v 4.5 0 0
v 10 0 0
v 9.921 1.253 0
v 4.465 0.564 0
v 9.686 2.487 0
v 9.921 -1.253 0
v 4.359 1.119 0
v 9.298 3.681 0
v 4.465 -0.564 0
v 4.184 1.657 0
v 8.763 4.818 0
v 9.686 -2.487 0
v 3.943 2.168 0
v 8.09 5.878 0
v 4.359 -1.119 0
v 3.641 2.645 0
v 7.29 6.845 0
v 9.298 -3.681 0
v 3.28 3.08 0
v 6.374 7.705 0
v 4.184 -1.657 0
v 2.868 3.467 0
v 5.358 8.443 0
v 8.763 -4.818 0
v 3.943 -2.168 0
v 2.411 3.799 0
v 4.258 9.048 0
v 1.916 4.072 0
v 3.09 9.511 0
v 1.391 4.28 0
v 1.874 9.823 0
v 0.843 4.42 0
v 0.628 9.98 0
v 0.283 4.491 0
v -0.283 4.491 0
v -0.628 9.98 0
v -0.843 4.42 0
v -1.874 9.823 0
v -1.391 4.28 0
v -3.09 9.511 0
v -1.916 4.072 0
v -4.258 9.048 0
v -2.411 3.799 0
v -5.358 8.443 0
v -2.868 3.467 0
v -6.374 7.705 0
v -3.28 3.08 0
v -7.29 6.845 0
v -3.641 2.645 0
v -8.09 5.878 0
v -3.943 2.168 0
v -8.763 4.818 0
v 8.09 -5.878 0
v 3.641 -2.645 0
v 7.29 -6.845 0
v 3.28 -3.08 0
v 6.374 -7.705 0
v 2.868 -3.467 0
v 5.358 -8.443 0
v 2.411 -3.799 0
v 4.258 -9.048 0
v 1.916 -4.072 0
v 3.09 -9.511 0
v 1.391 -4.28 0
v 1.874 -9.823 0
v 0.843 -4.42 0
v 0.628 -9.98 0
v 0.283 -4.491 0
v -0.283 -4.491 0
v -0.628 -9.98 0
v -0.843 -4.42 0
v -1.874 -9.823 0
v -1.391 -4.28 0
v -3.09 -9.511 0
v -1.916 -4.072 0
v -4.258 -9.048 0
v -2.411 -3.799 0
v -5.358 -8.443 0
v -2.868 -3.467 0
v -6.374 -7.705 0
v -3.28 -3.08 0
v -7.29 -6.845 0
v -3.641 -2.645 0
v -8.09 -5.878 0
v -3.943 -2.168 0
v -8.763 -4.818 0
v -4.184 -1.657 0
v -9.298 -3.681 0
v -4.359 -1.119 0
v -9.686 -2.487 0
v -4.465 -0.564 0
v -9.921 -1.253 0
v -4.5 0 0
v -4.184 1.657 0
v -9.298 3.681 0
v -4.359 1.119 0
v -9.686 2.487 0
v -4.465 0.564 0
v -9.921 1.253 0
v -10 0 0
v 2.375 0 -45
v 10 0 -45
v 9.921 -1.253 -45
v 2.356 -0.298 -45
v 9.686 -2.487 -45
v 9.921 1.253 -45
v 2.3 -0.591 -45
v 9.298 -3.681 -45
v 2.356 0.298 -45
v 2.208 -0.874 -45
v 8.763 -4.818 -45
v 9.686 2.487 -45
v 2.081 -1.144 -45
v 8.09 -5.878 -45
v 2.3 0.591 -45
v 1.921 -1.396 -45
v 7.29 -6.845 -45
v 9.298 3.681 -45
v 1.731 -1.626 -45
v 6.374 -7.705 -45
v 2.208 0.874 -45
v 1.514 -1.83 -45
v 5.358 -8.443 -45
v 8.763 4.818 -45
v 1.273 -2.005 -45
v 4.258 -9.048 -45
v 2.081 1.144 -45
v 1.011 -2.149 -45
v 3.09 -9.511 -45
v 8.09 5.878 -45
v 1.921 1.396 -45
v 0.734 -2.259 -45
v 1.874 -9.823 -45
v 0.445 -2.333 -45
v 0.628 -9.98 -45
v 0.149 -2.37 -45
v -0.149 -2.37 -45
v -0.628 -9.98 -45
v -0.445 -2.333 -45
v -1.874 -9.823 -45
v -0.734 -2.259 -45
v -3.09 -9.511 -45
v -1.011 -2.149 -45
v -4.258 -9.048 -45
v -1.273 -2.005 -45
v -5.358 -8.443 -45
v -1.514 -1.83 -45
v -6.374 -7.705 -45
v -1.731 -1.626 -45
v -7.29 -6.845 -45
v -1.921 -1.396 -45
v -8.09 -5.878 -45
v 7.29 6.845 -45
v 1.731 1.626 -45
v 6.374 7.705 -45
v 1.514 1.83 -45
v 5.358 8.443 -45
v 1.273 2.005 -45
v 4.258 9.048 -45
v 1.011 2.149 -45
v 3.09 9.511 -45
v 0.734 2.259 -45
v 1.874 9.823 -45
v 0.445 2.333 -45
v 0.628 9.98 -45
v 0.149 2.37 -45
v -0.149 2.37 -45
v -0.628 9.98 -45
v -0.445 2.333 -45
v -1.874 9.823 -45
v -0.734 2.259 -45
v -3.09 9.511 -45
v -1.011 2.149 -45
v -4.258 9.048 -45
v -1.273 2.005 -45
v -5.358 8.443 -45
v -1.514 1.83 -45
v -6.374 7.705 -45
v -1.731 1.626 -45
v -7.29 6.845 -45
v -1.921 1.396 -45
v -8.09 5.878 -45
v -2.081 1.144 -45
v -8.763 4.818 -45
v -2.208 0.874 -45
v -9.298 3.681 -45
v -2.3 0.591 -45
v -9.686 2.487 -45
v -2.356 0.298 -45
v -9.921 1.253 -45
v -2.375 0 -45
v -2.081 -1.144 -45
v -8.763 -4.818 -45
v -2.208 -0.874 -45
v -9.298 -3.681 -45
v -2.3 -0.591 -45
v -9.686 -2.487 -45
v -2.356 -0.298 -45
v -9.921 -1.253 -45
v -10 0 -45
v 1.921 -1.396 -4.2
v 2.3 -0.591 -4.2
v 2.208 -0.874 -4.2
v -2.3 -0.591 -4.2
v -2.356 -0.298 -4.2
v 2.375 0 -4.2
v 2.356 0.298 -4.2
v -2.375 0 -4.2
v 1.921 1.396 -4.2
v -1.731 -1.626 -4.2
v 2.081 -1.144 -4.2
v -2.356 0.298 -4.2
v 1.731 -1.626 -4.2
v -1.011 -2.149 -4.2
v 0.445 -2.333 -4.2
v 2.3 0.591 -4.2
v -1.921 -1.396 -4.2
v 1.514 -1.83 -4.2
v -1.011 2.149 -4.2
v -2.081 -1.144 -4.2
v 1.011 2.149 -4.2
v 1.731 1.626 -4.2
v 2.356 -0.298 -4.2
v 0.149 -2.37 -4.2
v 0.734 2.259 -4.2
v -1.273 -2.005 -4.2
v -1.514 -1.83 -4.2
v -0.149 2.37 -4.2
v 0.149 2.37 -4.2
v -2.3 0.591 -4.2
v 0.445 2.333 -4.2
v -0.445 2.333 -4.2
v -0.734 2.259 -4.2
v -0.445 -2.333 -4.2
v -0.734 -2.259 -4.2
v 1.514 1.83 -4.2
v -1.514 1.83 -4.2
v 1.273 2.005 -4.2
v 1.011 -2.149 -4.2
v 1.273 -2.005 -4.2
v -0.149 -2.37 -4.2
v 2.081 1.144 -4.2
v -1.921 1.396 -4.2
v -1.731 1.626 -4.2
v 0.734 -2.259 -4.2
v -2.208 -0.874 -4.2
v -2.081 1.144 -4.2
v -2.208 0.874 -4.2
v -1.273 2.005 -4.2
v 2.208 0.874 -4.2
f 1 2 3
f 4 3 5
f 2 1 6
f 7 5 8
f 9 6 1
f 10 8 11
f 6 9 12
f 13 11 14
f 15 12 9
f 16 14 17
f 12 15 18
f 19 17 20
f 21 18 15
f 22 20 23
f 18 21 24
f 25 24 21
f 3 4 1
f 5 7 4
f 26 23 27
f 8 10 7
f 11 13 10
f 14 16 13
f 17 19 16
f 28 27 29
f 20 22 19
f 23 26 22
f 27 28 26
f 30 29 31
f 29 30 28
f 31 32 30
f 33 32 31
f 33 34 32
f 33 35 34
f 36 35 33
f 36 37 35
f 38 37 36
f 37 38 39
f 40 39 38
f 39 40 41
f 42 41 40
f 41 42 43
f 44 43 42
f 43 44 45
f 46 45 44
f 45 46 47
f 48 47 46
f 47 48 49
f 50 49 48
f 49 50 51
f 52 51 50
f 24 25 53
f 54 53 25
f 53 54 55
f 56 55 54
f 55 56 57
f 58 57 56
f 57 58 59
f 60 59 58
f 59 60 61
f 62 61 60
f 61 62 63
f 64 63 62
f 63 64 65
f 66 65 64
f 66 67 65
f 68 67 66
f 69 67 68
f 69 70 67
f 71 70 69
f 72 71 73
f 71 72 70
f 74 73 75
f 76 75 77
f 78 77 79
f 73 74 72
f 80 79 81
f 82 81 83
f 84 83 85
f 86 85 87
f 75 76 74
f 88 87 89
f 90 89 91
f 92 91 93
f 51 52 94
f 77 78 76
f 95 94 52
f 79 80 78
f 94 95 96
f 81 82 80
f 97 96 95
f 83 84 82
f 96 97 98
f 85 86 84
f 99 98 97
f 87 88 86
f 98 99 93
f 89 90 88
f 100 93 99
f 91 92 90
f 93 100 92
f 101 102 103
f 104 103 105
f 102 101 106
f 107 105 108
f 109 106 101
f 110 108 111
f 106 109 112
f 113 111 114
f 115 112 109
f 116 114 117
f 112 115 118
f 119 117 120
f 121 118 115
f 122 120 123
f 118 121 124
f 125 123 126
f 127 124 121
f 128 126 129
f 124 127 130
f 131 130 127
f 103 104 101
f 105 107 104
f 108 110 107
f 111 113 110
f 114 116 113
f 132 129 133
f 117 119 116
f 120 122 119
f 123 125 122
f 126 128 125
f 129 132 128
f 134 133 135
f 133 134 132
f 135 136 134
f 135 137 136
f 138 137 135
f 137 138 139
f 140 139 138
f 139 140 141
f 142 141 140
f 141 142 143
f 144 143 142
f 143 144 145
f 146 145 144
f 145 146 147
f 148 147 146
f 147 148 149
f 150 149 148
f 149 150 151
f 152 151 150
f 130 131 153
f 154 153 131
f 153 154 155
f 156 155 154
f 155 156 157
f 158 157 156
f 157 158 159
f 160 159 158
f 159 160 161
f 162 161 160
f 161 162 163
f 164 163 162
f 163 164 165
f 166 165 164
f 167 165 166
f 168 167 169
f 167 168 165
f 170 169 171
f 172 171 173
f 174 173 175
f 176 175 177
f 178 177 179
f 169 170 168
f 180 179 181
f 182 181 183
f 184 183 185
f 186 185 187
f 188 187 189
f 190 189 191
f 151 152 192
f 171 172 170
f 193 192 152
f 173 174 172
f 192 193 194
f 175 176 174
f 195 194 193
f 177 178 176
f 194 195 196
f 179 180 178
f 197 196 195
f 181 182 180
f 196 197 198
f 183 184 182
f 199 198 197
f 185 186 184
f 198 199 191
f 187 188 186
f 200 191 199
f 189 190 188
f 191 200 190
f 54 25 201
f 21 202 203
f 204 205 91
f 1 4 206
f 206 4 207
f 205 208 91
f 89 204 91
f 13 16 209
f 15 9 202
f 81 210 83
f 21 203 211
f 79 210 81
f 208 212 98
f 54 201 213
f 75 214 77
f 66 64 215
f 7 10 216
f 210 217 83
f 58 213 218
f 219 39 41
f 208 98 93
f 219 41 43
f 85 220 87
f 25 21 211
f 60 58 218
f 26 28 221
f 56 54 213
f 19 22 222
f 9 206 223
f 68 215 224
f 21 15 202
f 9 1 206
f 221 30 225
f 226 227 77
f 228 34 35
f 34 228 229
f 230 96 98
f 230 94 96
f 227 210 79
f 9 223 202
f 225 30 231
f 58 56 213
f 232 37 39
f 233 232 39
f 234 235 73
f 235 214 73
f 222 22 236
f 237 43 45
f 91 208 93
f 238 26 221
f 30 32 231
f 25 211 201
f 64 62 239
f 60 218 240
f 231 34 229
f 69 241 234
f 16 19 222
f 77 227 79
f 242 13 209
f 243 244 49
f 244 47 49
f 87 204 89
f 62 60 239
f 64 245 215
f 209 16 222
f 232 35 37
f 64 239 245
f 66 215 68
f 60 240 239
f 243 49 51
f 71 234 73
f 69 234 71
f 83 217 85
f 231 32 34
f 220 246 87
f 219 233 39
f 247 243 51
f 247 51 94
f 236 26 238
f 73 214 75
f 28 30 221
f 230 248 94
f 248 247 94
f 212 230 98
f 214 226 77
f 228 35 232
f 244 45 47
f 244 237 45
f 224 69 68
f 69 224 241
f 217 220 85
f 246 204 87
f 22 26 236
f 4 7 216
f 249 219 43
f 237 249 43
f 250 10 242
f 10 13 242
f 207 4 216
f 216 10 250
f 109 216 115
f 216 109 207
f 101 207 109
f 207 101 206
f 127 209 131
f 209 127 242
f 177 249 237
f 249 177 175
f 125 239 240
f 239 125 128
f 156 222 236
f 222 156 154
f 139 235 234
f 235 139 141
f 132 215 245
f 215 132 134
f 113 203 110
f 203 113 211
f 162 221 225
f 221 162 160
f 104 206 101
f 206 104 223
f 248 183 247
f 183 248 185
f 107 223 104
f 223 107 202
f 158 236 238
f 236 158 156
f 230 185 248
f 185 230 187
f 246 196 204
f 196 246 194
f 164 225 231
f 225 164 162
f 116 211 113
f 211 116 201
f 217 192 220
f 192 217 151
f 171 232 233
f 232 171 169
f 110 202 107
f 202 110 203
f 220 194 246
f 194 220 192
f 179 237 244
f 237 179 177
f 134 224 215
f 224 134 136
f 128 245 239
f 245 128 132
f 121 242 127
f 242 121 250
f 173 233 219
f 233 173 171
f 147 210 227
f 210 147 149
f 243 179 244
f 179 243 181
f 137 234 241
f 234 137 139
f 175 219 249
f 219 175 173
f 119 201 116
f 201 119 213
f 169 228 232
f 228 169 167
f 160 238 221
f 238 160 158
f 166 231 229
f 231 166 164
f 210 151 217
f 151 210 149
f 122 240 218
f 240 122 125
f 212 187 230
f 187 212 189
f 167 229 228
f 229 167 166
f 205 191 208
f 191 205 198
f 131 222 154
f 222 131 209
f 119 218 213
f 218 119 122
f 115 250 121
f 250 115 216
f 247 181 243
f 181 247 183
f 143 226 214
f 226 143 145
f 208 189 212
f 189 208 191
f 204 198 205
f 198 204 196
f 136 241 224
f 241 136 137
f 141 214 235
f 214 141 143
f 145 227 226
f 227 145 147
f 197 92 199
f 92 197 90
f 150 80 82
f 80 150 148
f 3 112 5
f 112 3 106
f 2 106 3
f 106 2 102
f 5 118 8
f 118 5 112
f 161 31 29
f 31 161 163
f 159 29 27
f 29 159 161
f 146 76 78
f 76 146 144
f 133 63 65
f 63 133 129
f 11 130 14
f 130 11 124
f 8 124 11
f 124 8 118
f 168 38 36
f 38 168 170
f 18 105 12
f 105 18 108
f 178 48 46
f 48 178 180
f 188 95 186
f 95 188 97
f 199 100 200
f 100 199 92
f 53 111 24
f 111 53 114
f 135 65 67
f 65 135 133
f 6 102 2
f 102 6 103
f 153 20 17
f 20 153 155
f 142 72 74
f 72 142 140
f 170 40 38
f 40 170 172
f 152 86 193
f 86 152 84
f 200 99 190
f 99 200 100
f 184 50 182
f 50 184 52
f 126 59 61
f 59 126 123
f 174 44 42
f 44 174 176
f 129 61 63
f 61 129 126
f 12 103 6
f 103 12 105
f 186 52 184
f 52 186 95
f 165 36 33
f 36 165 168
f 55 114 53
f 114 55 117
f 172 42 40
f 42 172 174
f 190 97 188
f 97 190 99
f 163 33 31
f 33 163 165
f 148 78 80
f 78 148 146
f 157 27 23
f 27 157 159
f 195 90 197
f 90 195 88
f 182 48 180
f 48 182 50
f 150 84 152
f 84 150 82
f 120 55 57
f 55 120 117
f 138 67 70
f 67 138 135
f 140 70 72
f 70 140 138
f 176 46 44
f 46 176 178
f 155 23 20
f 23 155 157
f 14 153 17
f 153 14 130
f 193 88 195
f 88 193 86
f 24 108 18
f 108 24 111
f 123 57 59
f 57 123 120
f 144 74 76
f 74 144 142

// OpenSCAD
$fn = 50;


difference() {
	union() {
		translate(v = [0, 0, -45.0000000000]) {
			cylinder(h = 45, r = 10.0000000000);
		}
		cylinder(h = 0, r = 13.0000000000);
	}
	union() {
		translate(v = [0, 0, 0]) {
			rotate(a = [0, 0, 0]) {
				difference() {
					union() {
						#translate(v = [0, 0, -45.0000000000]) {
							cylinder(h = 45, r = 2.2500000000);
						}
						#translate(v = [0, 0, -4.2000000000]) {
							cylinder(h = 4.2000000000, r1 = 2.3750000000, r2 = 4.5000000000);
						}
						#translate(v = [0, 0, -45.0000000000]) {
							cylinder(h = 45, r = 2.3750000000);
						}
						#translate(v = [0, 0, -45.0000000000]) {
							cylinder(h = 45, r = 2.2500000000);
						}
					}
					union();
				}
			}
		}
	}
}
